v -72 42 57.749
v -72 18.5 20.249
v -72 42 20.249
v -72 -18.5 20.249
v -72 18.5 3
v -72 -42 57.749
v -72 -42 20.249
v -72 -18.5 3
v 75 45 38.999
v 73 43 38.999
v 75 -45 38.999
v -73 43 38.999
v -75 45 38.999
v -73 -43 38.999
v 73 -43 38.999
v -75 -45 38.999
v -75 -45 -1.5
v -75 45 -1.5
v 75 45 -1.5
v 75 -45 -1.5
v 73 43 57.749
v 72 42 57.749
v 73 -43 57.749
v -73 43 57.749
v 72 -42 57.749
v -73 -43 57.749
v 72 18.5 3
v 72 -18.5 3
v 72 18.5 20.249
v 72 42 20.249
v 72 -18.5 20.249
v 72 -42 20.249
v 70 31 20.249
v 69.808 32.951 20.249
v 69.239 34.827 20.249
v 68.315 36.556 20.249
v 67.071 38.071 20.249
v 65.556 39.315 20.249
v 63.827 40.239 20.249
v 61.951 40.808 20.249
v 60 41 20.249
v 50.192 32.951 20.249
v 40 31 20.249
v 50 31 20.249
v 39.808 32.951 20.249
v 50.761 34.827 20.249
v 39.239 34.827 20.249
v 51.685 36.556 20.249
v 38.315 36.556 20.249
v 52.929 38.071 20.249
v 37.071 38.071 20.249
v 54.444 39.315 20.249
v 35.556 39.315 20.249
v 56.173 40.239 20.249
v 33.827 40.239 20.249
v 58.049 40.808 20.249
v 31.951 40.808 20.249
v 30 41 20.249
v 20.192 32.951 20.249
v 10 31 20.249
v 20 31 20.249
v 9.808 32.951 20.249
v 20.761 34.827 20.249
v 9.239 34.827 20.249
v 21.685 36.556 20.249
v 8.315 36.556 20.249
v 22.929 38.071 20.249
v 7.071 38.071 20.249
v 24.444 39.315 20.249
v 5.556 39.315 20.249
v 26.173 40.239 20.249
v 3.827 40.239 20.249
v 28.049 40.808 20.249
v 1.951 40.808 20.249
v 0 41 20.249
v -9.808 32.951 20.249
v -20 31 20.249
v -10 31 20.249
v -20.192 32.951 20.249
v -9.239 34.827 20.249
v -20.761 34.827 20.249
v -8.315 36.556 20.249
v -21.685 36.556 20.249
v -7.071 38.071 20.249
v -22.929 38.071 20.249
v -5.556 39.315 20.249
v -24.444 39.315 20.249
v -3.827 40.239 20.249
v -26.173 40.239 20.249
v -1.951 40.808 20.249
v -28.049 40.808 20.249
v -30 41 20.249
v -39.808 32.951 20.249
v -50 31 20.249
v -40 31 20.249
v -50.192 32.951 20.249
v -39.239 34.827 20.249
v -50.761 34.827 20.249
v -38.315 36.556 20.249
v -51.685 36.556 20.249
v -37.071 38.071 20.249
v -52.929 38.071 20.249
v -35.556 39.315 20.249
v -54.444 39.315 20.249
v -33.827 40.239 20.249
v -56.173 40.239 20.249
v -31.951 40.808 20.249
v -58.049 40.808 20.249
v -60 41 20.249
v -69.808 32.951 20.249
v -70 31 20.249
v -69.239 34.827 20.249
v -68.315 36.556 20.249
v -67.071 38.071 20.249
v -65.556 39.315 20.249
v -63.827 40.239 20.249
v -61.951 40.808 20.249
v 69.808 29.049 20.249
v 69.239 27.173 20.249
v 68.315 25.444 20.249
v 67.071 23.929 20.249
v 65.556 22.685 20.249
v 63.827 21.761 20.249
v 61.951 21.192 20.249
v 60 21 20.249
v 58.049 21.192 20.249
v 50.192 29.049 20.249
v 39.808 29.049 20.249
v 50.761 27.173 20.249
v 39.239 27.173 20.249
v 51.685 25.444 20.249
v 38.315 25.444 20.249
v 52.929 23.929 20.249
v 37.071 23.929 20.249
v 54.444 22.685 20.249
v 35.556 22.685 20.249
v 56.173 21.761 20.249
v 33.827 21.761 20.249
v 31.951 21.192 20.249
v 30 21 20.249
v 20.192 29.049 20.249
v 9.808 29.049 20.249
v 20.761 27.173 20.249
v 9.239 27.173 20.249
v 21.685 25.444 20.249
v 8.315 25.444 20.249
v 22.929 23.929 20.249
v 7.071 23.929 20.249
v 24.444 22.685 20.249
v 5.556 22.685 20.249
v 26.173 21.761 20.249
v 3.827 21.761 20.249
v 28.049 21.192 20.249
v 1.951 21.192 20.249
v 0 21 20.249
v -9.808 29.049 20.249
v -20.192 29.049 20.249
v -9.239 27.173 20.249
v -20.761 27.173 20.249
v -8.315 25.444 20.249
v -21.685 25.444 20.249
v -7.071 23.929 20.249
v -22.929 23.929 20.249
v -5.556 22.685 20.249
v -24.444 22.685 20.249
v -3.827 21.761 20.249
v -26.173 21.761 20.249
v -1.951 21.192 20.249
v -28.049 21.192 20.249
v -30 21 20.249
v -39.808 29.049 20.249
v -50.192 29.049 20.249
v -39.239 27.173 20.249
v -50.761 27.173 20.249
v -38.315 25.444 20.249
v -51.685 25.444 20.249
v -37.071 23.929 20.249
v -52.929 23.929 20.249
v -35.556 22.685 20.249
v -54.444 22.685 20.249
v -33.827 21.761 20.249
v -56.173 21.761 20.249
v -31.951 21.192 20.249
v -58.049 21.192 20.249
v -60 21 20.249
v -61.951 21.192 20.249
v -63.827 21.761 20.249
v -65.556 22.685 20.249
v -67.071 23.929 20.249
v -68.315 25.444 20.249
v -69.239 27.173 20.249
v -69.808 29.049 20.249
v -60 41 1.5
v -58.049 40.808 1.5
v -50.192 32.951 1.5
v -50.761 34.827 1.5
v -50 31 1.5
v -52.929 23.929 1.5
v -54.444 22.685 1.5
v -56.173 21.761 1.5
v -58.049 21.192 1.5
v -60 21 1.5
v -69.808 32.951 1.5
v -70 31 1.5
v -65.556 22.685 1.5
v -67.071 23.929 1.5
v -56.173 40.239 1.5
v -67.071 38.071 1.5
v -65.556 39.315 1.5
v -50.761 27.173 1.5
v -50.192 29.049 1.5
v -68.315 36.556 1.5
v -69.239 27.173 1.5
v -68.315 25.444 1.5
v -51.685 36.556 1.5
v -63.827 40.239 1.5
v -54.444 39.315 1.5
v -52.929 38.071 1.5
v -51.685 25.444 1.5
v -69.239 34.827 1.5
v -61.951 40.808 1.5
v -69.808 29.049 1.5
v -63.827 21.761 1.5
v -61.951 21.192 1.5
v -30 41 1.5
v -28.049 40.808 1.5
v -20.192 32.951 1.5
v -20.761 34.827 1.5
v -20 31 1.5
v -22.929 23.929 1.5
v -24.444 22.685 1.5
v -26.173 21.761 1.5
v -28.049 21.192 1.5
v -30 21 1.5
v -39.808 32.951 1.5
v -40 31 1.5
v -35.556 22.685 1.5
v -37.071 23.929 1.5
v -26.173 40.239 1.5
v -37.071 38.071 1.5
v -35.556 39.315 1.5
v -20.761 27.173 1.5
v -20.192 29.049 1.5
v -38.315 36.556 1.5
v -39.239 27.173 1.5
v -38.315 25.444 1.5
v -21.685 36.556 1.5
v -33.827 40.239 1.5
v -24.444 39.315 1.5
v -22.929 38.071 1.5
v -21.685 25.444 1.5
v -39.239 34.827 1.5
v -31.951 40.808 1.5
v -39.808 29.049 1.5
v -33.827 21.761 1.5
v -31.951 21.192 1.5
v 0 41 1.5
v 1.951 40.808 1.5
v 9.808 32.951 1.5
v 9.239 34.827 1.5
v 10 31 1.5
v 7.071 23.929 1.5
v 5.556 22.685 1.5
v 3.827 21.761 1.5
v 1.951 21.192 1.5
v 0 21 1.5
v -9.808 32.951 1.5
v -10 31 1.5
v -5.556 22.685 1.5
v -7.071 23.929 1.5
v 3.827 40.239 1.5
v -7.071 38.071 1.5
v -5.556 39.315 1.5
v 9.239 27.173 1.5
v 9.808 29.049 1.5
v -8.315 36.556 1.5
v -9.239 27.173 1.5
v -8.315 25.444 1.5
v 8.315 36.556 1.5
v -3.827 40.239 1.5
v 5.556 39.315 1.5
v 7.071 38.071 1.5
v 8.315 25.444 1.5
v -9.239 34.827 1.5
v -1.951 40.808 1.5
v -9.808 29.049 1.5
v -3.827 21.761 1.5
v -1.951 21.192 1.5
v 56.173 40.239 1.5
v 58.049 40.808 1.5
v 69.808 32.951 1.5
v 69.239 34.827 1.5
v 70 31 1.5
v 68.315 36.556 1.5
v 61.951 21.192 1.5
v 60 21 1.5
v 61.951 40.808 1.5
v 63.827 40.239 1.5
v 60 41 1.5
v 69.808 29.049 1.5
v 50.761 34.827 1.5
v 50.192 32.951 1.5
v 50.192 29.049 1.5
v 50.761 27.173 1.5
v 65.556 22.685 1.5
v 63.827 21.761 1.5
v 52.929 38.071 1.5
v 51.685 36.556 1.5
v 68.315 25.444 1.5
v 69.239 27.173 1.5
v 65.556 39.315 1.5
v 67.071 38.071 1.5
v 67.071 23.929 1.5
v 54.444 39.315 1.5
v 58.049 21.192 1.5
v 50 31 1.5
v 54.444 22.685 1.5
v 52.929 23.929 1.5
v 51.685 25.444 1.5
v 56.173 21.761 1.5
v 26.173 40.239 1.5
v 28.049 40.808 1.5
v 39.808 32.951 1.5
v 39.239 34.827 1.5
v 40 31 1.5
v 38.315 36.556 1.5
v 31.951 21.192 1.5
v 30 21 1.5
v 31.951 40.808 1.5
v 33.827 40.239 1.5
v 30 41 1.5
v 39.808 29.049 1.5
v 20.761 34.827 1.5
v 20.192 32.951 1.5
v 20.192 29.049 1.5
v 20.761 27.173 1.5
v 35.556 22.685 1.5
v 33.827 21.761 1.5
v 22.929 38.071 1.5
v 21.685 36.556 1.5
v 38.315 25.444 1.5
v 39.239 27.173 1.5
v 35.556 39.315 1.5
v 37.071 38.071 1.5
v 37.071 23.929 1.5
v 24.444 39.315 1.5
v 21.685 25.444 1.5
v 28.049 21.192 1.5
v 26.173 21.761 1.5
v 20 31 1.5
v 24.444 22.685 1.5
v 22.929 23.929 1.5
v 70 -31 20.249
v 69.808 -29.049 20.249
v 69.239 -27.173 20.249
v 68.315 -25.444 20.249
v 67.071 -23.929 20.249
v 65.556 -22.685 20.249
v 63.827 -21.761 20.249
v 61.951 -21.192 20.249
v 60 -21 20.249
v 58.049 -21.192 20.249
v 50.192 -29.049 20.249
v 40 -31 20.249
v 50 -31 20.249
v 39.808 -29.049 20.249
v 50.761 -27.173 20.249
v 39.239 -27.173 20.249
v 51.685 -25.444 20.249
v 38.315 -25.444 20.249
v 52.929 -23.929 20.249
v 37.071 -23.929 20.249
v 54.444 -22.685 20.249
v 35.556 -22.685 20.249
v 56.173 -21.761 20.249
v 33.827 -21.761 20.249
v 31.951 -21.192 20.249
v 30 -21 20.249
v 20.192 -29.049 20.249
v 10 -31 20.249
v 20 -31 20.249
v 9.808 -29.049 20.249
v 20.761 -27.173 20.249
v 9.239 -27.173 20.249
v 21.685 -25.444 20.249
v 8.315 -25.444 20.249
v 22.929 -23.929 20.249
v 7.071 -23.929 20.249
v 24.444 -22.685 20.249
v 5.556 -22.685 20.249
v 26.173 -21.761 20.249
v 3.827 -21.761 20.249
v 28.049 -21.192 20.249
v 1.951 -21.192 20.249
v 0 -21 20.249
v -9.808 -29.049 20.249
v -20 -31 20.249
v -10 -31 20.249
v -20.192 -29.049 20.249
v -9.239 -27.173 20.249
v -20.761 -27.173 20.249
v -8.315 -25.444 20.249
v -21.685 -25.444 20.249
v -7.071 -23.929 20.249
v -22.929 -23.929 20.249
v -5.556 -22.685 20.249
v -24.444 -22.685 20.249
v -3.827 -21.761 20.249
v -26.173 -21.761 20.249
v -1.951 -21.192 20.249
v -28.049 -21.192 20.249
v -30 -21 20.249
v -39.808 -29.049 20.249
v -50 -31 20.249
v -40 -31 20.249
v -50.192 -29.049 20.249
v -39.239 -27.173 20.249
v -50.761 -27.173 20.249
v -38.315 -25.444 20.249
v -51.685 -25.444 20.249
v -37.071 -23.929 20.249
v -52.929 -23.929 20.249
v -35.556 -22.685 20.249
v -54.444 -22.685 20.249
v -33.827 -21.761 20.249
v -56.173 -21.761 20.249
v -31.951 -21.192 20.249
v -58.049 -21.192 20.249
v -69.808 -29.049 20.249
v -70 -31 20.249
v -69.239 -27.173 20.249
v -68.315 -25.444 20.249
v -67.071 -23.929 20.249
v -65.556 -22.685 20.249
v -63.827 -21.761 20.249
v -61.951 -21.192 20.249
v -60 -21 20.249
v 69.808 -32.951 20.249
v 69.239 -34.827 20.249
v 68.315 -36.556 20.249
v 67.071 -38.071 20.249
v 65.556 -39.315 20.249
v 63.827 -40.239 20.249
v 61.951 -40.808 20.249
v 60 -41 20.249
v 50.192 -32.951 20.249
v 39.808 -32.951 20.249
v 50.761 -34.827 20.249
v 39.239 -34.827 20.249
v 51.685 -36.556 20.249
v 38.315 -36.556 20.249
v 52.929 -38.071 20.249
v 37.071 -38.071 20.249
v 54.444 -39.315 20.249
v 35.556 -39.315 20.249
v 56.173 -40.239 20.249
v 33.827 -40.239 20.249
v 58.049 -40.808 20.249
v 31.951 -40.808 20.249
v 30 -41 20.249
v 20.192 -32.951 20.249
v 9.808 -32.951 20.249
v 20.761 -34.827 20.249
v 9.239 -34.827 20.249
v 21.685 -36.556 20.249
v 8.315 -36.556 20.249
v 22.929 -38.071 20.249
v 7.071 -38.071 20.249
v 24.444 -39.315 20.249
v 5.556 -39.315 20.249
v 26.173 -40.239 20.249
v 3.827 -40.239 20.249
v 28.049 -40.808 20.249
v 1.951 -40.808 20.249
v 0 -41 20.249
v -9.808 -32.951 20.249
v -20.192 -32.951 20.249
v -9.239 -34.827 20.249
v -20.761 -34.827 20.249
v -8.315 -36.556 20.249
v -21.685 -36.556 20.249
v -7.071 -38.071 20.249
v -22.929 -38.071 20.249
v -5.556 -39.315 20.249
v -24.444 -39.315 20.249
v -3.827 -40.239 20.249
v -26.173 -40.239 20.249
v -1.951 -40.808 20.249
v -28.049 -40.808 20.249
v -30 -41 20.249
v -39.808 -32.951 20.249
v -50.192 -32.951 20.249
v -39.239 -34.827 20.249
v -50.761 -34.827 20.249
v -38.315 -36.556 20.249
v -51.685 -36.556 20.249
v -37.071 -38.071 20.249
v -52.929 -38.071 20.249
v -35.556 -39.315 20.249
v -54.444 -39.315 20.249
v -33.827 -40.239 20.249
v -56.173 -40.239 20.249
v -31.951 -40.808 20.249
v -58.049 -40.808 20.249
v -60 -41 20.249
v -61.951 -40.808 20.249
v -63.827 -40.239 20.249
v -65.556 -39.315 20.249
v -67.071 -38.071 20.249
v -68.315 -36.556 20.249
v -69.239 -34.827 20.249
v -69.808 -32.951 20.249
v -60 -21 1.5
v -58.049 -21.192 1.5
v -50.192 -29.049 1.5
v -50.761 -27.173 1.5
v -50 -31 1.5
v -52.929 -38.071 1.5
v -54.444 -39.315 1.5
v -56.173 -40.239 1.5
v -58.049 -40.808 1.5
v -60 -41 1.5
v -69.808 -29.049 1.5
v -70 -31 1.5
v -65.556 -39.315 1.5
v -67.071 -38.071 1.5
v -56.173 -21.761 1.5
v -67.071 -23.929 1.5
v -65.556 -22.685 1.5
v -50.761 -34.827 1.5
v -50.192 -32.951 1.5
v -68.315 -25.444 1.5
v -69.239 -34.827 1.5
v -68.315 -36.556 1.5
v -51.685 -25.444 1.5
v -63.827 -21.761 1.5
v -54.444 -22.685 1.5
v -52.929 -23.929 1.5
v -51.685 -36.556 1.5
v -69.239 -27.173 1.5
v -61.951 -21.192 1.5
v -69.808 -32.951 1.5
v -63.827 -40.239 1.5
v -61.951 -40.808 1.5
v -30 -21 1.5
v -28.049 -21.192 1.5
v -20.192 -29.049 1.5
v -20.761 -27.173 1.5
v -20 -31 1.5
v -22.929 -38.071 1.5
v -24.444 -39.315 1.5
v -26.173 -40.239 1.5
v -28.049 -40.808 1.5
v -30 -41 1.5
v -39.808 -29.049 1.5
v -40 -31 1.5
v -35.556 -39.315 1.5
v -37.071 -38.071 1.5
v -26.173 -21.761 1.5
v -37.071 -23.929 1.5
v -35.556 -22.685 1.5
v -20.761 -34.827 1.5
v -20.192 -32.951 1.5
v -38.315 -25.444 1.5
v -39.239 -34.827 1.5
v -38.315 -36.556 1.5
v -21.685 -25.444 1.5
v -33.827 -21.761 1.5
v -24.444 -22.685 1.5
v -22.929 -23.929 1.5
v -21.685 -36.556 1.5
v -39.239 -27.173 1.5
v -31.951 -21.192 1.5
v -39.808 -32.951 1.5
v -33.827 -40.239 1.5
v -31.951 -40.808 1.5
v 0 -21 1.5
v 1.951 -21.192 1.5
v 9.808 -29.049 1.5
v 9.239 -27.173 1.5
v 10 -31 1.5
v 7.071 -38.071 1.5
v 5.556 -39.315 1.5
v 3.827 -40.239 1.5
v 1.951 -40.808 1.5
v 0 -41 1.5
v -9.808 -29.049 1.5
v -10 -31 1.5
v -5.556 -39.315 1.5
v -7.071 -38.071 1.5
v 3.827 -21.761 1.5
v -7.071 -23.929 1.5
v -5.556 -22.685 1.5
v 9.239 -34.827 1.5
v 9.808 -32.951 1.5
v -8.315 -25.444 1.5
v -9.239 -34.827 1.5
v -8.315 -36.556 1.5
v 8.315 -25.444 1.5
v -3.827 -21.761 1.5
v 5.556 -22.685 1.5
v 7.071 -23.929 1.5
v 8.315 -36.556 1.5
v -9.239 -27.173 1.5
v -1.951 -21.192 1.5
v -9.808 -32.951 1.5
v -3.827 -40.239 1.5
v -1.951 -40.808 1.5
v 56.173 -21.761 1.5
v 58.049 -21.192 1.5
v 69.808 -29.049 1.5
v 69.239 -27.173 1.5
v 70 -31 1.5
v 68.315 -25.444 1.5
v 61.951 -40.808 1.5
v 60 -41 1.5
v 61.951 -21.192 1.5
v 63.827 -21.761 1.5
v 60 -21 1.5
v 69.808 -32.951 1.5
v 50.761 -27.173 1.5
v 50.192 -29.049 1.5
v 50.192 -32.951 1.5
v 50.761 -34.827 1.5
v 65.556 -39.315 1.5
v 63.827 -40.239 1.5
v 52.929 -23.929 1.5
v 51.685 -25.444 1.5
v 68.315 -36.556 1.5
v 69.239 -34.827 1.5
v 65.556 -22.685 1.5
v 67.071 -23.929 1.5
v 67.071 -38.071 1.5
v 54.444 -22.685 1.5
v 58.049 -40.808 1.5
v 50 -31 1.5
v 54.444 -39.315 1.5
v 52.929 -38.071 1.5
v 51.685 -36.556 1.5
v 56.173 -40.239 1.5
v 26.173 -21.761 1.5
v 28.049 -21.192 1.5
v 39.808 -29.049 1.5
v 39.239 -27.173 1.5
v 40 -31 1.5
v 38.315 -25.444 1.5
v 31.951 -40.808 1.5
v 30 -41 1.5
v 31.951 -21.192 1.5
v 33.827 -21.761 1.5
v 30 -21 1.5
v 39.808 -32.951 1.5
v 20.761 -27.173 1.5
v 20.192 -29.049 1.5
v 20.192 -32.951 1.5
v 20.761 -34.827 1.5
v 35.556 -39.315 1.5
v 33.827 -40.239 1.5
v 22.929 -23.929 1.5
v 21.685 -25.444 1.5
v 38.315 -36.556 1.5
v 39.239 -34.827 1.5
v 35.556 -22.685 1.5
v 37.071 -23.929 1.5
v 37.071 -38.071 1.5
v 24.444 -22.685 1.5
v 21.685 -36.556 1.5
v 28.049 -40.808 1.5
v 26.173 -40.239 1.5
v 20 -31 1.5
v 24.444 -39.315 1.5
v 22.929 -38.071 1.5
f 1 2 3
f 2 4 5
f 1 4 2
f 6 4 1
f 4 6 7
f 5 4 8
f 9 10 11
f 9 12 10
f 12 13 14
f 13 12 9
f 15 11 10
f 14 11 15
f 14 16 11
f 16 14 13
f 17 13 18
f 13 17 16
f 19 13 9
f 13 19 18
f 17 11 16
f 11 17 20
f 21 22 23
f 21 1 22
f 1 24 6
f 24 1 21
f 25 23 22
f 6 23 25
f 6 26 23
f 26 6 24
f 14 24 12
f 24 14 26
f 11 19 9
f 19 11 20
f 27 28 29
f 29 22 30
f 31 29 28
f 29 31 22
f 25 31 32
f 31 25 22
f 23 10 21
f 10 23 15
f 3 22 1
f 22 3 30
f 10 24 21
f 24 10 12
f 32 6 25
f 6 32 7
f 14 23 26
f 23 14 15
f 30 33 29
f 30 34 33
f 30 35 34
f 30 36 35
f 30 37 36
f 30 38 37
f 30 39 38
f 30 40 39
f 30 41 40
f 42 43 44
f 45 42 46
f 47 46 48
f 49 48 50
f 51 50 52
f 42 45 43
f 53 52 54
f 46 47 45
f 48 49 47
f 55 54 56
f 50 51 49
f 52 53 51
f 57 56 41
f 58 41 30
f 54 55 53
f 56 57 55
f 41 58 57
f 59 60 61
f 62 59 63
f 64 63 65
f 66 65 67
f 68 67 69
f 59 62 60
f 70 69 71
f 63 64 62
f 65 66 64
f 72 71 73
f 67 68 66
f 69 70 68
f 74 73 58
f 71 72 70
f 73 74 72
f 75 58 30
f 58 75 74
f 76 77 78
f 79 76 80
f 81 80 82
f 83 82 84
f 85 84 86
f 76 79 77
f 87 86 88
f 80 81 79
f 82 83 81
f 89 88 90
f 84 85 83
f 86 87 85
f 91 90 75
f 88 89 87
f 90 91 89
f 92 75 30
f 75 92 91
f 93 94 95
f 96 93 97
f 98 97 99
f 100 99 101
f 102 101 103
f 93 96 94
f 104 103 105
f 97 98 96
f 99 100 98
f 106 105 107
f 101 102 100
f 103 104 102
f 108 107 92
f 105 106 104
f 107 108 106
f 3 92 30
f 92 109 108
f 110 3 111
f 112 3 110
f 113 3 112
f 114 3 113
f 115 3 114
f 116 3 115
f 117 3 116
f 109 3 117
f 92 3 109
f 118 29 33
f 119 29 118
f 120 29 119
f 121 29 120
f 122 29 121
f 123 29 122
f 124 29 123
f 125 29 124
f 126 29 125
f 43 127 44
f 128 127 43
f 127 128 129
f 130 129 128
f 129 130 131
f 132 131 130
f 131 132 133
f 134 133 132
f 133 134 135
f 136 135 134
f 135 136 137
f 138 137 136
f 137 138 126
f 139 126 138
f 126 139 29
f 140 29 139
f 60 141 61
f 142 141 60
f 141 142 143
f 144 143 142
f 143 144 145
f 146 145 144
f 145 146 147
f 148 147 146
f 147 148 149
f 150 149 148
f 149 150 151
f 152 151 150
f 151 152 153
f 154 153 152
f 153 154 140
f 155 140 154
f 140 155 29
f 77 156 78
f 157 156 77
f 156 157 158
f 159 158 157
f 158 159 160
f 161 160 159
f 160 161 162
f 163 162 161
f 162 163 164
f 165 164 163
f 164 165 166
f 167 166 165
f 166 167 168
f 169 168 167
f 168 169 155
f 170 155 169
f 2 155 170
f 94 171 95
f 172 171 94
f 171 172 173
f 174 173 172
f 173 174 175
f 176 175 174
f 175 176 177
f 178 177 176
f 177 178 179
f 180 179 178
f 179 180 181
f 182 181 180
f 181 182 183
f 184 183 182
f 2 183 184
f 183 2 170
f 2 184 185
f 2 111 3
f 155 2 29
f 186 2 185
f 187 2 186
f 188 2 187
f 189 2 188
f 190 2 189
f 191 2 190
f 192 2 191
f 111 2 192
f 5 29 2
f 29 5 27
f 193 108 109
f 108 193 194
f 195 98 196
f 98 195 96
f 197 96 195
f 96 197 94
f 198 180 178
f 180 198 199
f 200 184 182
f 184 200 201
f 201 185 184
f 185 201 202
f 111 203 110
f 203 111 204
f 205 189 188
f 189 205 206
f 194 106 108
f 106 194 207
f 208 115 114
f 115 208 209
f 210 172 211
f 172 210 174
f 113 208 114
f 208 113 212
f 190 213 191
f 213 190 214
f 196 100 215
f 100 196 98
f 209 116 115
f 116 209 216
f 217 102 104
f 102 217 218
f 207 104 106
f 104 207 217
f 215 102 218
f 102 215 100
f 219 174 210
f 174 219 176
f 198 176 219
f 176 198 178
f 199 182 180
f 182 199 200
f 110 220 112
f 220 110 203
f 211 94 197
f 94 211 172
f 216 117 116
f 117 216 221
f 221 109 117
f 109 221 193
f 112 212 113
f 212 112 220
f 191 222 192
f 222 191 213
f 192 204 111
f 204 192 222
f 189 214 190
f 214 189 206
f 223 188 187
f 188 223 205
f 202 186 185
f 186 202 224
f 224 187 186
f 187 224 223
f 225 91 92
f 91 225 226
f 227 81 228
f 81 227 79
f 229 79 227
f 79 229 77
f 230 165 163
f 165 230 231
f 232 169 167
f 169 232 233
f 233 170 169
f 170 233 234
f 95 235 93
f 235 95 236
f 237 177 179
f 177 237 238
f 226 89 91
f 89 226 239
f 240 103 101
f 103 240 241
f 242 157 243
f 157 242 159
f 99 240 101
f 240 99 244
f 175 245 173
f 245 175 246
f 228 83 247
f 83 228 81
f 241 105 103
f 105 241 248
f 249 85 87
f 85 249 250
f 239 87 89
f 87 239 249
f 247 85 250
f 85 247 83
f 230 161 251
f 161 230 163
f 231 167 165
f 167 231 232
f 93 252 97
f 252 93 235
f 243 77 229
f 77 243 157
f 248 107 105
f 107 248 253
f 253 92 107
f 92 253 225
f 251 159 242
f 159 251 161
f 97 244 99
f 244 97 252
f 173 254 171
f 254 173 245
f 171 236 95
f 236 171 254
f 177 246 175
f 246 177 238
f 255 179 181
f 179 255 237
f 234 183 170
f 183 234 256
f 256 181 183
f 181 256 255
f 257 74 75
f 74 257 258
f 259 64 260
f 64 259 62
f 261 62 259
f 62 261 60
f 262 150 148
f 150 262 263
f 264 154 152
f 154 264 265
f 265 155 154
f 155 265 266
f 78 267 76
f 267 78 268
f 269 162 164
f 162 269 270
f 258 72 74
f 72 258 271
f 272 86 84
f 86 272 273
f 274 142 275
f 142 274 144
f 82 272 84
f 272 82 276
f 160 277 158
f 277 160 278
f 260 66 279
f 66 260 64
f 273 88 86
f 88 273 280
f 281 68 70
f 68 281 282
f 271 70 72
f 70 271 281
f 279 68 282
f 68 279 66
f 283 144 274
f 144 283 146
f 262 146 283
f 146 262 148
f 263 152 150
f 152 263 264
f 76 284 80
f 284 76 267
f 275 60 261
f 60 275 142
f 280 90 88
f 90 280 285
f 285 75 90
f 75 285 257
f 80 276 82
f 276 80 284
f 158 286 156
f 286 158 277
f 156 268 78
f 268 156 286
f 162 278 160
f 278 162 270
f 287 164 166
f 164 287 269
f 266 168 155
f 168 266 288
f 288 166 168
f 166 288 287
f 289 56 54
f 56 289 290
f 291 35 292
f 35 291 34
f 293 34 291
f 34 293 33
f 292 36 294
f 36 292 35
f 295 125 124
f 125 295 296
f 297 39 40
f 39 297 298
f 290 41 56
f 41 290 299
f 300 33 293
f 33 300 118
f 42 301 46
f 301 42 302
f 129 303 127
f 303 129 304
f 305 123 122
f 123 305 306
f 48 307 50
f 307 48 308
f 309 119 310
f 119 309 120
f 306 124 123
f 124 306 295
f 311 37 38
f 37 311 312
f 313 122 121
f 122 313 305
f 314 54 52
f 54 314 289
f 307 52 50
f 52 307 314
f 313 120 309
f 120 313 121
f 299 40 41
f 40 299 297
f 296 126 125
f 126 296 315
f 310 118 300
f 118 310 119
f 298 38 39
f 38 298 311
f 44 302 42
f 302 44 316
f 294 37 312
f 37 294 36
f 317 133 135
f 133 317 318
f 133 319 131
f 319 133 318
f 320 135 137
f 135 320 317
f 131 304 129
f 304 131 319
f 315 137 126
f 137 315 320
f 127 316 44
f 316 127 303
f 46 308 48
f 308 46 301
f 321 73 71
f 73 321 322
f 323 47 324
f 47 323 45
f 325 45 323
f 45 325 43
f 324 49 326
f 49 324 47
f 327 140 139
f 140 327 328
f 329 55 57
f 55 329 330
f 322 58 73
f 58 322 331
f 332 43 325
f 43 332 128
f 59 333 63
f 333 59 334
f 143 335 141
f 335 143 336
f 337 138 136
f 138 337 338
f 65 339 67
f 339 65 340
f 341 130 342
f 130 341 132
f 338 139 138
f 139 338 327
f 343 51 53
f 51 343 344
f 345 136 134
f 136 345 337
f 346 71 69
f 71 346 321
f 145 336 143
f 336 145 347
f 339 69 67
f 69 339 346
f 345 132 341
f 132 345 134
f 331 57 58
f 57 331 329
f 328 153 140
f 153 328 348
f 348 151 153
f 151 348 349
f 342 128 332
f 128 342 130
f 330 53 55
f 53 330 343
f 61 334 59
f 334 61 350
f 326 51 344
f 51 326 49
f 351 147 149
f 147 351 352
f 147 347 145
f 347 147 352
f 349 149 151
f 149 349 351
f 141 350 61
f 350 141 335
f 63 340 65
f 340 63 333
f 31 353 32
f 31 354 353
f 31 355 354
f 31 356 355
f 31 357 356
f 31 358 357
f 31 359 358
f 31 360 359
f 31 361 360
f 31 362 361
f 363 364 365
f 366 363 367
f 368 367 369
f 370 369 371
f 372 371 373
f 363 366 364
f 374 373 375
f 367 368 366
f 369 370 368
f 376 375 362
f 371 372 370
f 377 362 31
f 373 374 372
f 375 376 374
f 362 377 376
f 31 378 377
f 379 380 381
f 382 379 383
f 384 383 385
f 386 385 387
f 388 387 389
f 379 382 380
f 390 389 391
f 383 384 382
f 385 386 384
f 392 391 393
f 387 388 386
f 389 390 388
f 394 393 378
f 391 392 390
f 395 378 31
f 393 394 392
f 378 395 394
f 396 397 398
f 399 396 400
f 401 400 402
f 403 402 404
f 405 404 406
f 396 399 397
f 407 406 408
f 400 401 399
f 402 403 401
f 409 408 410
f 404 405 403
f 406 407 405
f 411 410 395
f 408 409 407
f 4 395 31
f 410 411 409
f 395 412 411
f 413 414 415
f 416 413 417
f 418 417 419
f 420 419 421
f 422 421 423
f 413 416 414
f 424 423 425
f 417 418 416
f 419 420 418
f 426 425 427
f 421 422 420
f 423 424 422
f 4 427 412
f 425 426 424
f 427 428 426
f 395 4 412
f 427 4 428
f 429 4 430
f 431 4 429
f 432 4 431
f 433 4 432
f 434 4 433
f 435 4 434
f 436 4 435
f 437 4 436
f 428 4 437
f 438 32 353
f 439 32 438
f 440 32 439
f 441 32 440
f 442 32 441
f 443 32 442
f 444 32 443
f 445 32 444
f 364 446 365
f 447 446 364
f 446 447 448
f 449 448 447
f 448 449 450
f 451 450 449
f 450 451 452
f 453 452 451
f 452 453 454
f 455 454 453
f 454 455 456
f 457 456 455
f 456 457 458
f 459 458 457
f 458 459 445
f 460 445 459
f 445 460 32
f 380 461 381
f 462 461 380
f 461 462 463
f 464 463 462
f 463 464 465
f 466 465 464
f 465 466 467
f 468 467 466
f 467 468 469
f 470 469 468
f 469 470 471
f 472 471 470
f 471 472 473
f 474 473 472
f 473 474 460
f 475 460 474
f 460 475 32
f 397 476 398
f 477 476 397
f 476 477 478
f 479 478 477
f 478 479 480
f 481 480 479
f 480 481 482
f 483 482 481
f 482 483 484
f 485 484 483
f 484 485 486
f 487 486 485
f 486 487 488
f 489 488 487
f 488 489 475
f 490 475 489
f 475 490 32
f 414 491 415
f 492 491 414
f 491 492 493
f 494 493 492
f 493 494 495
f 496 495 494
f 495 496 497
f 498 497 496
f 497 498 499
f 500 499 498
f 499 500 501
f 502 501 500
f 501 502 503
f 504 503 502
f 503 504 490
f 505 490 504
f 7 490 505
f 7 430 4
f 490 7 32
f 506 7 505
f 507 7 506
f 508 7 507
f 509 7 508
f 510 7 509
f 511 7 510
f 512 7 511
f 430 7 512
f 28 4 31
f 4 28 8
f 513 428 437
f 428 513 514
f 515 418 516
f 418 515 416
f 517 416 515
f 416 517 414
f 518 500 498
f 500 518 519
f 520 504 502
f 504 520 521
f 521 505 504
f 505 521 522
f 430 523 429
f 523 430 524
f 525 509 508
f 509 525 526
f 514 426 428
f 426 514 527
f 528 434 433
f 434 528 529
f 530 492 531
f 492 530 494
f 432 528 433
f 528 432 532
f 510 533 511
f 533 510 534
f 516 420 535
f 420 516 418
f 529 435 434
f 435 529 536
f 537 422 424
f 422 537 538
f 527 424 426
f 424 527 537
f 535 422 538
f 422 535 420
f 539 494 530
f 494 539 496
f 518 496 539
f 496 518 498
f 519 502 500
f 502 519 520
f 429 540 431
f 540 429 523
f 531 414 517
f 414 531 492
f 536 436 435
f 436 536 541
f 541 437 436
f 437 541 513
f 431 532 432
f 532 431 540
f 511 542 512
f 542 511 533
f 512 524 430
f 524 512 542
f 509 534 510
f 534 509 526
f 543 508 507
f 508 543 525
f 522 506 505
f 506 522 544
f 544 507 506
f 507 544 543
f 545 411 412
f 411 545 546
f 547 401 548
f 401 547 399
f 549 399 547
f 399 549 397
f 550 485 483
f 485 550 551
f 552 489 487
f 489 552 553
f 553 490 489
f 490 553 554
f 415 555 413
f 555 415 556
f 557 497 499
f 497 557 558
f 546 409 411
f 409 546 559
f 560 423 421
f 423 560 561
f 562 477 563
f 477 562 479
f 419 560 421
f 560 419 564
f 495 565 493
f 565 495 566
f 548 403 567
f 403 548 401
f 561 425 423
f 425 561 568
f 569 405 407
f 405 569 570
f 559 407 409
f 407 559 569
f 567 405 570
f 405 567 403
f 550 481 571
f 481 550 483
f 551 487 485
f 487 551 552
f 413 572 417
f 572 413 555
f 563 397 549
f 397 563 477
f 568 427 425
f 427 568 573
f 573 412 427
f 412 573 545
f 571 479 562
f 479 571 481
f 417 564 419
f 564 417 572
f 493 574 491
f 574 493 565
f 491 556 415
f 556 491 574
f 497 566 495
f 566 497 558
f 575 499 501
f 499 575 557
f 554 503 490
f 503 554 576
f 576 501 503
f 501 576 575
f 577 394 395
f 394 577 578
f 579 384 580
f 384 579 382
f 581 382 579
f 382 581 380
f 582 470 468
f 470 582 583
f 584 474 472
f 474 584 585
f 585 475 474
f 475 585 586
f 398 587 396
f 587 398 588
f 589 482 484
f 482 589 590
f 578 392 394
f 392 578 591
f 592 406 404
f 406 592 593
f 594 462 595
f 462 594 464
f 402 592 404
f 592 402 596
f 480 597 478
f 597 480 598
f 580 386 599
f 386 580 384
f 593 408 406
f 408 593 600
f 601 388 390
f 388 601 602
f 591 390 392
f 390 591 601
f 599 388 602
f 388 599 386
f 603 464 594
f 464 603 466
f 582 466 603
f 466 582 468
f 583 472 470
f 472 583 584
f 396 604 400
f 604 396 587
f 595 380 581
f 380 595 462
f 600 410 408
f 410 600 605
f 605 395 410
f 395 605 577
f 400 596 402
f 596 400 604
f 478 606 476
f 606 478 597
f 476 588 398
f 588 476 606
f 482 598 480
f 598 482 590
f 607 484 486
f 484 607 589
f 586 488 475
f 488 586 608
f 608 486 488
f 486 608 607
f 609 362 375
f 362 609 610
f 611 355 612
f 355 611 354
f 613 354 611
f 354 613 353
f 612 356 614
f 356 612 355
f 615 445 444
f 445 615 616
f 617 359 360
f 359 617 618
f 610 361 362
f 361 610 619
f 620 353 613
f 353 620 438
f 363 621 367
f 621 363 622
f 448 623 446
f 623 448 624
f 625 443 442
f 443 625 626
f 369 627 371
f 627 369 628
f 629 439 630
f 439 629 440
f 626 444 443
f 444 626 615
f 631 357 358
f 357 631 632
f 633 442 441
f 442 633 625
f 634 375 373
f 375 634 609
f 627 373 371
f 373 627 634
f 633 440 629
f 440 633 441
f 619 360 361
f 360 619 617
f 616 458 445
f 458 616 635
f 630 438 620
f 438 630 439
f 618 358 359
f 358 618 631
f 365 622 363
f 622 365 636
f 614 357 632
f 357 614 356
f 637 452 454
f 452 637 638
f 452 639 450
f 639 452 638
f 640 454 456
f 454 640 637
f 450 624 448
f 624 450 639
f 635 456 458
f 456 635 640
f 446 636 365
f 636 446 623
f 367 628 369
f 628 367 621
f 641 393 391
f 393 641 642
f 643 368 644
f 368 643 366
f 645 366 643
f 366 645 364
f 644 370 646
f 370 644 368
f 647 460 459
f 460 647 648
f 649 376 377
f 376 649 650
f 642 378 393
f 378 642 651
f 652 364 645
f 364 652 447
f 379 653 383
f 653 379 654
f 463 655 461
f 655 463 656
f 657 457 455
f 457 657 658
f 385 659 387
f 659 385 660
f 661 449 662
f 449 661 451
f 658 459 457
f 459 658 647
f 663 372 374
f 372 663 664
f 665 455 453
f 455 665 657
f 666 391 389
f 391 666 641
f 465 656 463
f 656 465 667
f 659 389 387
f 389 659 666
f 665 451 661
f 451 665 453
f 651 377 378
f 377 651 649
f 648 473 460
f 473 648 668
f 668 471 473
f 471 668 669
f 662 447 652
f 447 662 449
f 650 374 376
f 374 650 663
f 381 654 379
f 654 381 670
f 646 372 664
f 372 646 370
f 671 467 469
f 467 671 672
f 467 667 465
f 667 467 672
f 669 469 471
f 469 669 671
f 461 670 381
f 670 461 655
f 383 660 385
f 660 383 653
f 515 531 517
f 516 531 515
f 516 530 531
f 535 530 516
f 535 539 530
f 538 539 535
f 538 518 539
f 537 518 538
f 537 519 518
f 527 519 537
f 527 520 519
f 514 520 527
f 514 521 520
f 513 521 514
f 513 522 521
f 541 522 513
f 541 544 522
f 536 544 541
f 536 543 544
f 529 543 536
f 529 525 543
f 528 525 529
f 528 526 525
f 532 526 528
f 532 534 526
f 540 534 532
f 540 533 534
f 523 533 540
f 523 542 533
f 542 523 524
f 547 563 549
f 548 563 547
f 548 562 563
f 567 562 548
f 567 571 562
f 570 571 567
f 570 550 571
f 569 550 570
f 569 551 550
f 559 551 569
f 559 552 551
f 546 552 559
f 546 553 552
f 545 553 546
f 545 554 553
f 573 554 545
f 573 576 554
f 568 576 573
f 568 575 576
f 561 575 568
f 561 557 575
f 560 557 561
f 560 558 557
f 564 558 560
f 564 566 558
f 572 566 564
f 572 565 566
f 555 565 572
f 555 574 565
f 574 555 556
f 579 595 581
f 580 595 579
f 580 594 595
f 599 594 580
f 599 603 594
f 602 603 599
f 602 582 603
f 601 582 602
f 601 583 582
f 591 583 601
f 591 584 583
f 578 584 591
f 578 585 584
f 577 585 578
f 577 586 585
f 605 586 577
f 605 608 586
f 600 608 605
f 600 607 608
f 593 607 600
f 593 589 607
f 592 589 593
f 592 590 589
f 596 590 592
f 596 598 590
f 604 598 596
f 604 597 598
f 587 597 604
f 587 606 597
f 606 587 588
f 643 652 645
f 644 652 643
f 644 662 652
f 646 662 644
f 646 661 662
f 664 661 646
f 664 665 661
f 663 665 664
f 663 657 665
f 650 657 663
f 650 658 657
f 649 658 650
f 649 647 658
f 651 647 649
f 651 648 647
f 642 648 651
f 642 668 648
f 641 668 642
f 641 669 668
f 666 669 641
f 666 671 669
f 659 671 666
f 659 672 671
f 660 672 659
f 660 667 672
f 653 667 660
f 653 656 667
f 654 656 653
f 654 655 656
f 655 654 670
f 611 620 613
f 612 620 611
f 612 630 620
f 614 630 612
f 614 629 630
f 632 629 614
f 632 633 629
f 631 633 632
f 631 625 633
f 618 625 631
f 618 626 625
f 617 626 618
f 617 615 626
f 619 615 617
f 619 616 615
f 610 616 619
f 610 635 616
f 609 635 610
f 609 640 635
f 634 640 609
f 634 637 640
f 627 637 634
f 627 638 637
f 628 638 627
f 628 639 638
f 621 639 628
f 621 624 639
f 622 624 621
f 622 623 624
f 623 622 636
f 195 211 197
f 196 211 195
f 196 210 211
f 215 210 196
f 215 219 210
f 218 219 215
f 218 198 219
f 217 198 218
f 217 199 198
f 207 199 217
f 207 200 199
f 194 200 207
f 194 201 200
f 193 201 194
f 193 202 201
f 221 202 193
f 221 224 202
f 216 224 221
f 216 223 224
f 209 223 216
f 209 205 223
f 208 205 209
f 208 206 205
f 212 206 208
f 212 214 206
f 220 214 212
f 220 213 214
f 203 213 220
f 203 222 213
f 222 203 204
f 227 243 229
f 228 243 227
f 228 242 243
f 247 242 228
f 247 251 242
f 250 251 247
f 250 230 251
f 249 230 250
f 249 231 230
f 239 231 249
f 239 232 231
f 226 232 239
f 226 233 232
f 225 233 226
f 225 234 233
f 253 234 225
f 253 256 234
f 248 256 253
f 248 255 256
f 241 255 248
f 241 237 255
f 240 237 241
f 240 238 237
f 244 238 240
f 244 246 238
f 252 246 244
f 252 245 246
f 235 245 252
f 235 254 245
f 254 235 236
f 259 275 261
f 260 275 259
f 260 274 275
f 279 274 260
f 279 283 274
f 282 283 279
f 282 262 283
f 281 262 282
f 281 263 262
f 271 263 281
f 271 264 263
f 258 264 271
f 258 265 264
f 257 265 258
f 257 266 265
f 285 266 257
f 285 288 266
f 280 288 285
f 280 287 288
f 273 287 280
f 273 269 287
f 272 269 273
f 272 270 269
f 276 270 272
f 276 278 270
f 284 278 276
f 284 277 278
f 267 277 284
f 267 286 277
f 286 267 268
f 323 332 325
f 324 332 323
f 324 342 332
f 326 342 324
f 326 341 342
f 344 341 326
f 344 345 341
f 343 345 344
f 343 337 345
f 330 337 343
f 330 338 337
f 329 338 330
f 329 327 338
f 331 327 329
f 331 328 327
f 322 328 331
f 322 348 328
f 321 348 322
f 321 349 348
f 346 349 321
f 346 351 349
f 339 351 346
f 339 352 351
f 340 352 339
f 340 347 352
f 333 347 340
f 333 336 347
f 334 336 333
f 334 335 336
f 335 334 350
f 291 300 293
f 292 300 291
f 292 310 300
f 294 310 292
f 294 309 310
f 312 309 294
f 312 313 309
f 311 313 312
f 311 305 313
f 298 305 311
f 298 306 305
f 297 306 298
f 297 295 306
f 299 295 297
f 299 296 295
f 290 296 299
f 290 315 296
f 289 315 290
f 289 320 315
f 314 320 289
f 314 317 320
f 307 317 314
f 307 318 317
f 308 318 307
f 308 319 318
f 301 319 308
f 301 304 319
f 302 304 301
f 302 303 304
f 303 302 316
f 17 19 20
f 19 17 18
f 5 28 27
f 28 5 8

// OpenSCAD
/**
 * @file snapOnImpactScrewDriverBox.scad
 *
 * @version 1.0
 *
 * @author Calum Judd Anderson
 *
 * @brief The chain adjuster bolt for the Cagiva Mito/Raptor/Planet swinging arm
 */

$fa = 0.01;
INTERFERENCE_FIT = 0.001;
SLIDE_FIT = 0.05;

BASE_WIDTH= 90;
BASE_LENGTH = 150;
WALL_THICKNESS = 3;
WALL_HEIGHT = 37.5;
SLIDE_WALL_THICKNESS = WALL_THICKNESS - 1;
SLIDE_WALL_HEIGHT= WALL_HEIGHT/2;

/**
 * @brief Mocks the driver so that it can be placed in the box as a reference.
 */
module snapOnInpactScrewDriver() {
    screwDriverBodyWidth = 32.00;
    screwDriverBodyDepth = 32.00;
    screwDriverBodyLength = 115.00;
    screwDriverDiameter = 35.75;
    
    screwDriverBodyInsertDiameter = 25.50;
    screwDriverBodyInsertHeight = 5;
    
    screwDriverImpactTaperDiameter = 17.00;
    screwDriverImpactTaperHeight = 10.00;
    
    screwDriverSocketWidth = 10.0;
    screwDriverSocketDepth = 10.0;
    screwDriverSocketHeight = 11.5;
    union() {
        intersection() {
            cylinder(screwDriverBodyLength, d = screwDriverDiameter, center=true);
            cube([screwDriverBodyWidth, screwDriverBodyDepth, screwDriverBodyLength], center = true);
        }
        translate([0, 0, ((screwDriverBodyLength + screwDriverBodyInsertHeight)/2) - INTERFERENCE_FIT])
            cylinder(screwDriverBodyInsertHeight, d = screwDriverBodyInsertDiameter, center = true);
        
        translate([0 , 0, ((screwDriverBodyLength + screwDriverBodyInsertHeight + screwDriverImpactTaperHeight)/2) - INTERFERENCE_FIT])
        cylinder(screwDriverImpactTaperHeight, d = screwDriverImpactTaperDiameter, center = true);
        translate([0 , 0, ((screwDriverBodyLength + screwDriverBodyInsertHeight + screwDriverImpactTaperHeight + screwDriverSocketHeight)/2) - INTERFERENCE_FIT])
        cube([screwDriverSocketWidth, screwDriverSocketDepth, screwDriverSocketHeight], center = true);
    }
}

/**
 * @brief Example socket insert so it can be placed in the box as a reference.
 */
module exampleSocket() {
    socketDiameter = 18.00;
    socketHeight = 15.00;
    
    socketInnerTaperDiameter = 16;
    socketInnerTaperTransitionHeight = 2.00;
    socketInnerTaperHeight = 9.5;
    
    socketBitWidth = 9.00;
    socketBitHeight = 22.00;
    
    union() {
        cylinder(socketHeight, d=socketDiameter, center = true);
        translate([0, 0, ((socketHeight + socketInnerTaperTransitionHeight)/2) - INTERFERENCE_FIT])
            cylinder(socketInnerTaperTransitionHeight, socketDiameter/2, socketInnerTaperDiameter/2, center = true);
        
        translate([0, 0, ((socketHeight + socketInnerTaperHeight)/2) + socketInnerTaperTransitionHeight - INTERFERENCE_FIT])
            cylinder(socketInnerTaperHeight, d = socketInnerTaperDiameter, center = true);

        translate([0, 0, ((socketHeight + socketBitHeight)/2) + socketInnerTaperHeight + socketInnerTaperTransitionHeight - INTERFERENCE_FIT])
            cube([socketBitWidth, socketBitWidth, socketBitHeight], center = true);
    }
}

/**
 * @brief Tray to hold the sockets in.
 */
module socketInsertBox(boxLength, boxWidth, socketDiameter, socketHeight) {
    difference() {
        cube([boxLength, boxWidth, socketDiameter], center = true);
        
        translate([-(socketDiameter * 3), 0, 0])
            cylinder(boxWidth + INTERFERENCE_FIT, d = socketDiameter, center = true);
        
        translate([-(socketDiameter * 2) + socketDiameter/2, 0, 0])
            cylinder(boxWidth + INTERFERENCE_FIT, d = socketDiameter, center = true);
        
        cylinder(boxWidth + INTERFERENCE_FIT, d = socketDiameter, center = true);
        
        translate([(socketDiameter * 3), 0, 0])
            cylinder(boxWidth + INTERFERENCE_FIT, d = socketDiameter, center = true);
        
        translate([(socketDiameter * 2) - socketDiameter/2, 0, 0])
            cylinder(boxWidth + INTERFERENCE_FIT, d = socketDiameter, center = true);
    }
}

/**
 * @brief Box to hold the screw driver and sockets.
 */
module snapOnImpactScrewDriverBox(wallThickness, wallHeight, slideWallThickness, slideWallHeight, baseWidth, baseLength) {

    socketDiameterWithSlack = 20.00;
    socketDiameterHeight = 17.50;
    socketTrayWidth = socketDiameterWithSlack + 5.00;

    baseSocketReinforcementWidth = baseWidth - (socketTrayWidth*2);

    union() {
        /* Base plate */
        color("red")
            cube([baseLength, baseWidth, wallThickness], center=true);
        /* Screw Driver Base Plate Reinforcement */
        color("white")
            translate([0, 0, wallThickness/2])
                cube([baseLength - wallThickness + INTERFERENCE_FIT, baseSocketReinforcementWidth, wallThickness], center=true);

        /* Back Wall */
        translate([-(baseLength - wallThickness)/2, 0, ((wallThickness + wallHeight)/2) - INTERFERENCE_FIT])
            union() {            
                cube([wallThickness, baseWidth, wallHeight], center=true);
                translate([slideWallThickness/2 ,0, (wallHeight + slideWallHeight)/2])
                    cube([slideWallThickness/2, (baseWidth - (wallThickness*2)) + INTERFERENCE_FIT, slideWallHeight], center=true);
            }

        /* Front Wall */
        translate([(baseLength - wallThickness)/2, 0, ((wallThickness + wallHeight)/2) - INTERFERENCE_FIT])
            union() {            
                cube([wallThickness, baseWidth, wallHeight], center=true);
                translate([-slideWallThickness/2 ,0, (wallHeight + slideWallHeight)/2])
                    cube([slideWallThickness/2, (baseWidth - (wallThickness*2)) + INTERFERENCE_FIT, slideWallHeight], center=true);
            }

        /* Side Wall */
        translate([0, (baseWidth - wallThickness)/2, ((wallThickness + wallHeight)/2) - INTERFERENCE_FIT])
            union() {
                cube([baseLength, wallThickness, wallHeight], center=true);
                translate([0, -slideWallThickness/2, (wallHeight + slideWallHeight)/2])
                    cube([baseLength - (slideWallThickness*2), slideWallThickness/2, slideWallHeight], center=true);
            }

        translate([0, -(baseWidth - wallThickness)/2, ((wallThickness + wallHeight)/2) - INTERFERENCE_FIT])
            union() {
                cube([baseLength, wallThickness, wallHeight], center=true);
                translate([0, slideWallThickness/2, (wallHeight + slideWallHeight)/2])
                    cube([baseLength - (slideWallThickness*2), slideWallThickness/2, slideWallHeight], center=true);
            }

        /* Socket Inserts */
        translate([0, (baseWidth - socketTrayWidth - wallThickness)/2, ((socketDiameterHeight + wallThickness)/2) - INTERFERENCE_FIT])
            socketInsertBox((baseLength - (wallThickness*2)), socketTrayWidth, socketDiameterWithSlack, socketDiameterHeight);
        
        translate([0, -(baseWidth - socketTrayWidth - wallThickness)/2, ((socketDiameterHeight + wallThickness)/2) - INTERFERENCE_FIT])
            socketInsertBox((baseLength - (wallThickness*2)), socketTrayWidth, socketDiameterWithSlack, socketDiameterHeight);
    }
}

module snapOnImpactScrewDriverLid(wallThickness, wallHeight, baseWidth, baseLength) {
    slideInterferenceFit = 0.15;
    
    union() {
        /* Lid */
        difference() {
            cube([baseLength, baseWidth, wallThickness], center = true);
            translate([-30, 0, (wallThickness/2) - INTERFERENCE_FIT])
                union() {
                    linear_extrude(wallThickness/2, center = true)
                        text("Snap-On", size=10);
                    translate([-13, -10, 0])
                    linear_extrude(wallThickness/2, center = true)
                        text("Impact Driver", size=10);
                }
        }
        
        /* Front Wall */
        translate([(baseLength - wallThickness + slideInterferenceFit)/2, 0, -((wallThickness + wallHeight)/2) + INTERFERENCE_FIT])
            cube([wallThickness - slideInterferenceFit, baseWidth, wallHeight], center=true);
        
        /* Back Wall */
        translate([-(baseLength - wallThickness + slideInterferenceFit)/2, 0, -((wallThickness + wallHeight)/2) + INTERFERENCE_FIT])
            cube([wallThickness - slideInterferenceFit, baseWidth, wallHeight], center=true);
        
        /* Side Walls */
        translate([0, (baseWidth - wallThickness + slideInterferenceFit)/2, -((wallThickness + wallHeight)/2) + INTERFERENCE_FIT])
            cube([baseLength - wallThickness, wallThickness - slideInterferenceFit, wallHeight], center=true);
        translate([0, -(baseWidth - wallThickness + slideInterferenceFit)/2, -((wallThickness + wallHeight)/2) +INTERFERENCE_FIT])
            cube([baseLength - wallThickness, wallThickness - slideInterferenceFit, wallHeight], center=true);
    }
}

snapOnImpactScrewDriverBox(WALL_THICKNESS, WALL_HEIGHT, SLIDE_WALL_THICKNESS, SLIDE_WALL_HEIGHT, BASE_WIDTH, BASE_LENGTH);

//translate([0, -BASE_WIDTH, (WALL_HEIGHT * 1.5) + 3])
//   rotate([30, 0, 0])
//        snapOnImpactScrewDriverLid(SLIDE_WALL_THICKNESS, SLIDE_WALL_HEIGHT, BASE_WIDTH, BASE_LENGTH);

//color("grey")
//    translate([-10, 0, 20])
//        rotate([0, 90, 0])
//            snapOnInpactScrewDriver();
//
//color("grey")
//    translate([-60, 30, 10])
//        exampleSocket();
//color("grey")
//    translate([-30, 30, 10])
//        exampleSocket();
//color("grey")
//    translate([0, 30, 10])
//        exampleSocket();
//color("grey")
//    translate([30, 30, 10])
//        exampleSocket();
//color("grey")
//    translate([60, 30, 10])
//        exampleSocket();
//color("grey")
//    translate([-60, -30, 10])
//        exampleSocket();
//color("grey")
//    translate([-30, -30, 10])
//        exampleSocket();
//color("grey")
//    translate([0, -30, 10])
//        exampleSocket();
//color("grey")
//    translate([30, -30, 10])
//        exampleSocket();
//color("grey")
//    translate([60, -30, 10])
//        exampleSocket();
